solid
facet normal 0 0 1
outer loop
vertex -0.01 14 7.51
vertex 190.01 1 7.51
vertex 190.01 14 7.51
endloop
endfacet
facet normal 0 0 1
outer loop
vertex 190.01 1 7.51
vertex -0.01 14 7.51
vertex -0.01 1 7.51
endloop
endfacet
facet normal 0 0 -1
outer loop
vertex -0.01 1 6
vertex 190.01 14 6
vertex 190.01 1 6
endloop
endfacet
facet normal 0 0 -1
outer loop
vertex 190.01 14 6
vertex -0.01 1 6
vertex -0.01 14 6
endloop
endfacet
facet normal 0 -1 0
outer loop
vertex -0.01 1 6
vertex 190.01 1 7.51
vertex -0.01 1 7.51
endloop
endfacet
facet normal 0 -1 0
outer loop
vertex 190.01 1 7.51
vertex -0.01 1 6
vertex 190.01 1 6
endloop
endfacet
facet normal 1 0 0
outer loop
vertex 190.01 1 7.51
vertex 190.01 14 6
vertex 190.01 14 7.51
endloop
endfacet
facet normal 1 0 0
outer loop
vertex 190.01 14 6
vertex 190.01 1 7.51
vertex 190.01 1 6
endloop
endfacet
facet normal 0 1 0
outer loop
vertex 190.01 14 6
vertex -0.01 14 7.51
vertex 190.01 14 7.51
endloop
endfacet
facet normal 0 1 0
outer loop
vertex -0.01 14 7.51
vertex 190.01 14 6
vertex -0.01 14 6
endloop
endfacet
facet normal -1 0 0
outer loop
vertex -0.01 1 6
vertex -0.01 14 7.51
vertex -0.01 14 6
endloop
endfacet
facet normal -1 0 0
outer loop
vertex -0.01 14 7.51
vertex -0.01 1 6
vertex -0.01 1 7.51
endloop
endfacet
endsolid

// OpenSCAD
eps = 0.01;


b_t = 1;
b_w = 2;
t_t = 1.5;
s_h = 5;
s_w = 11;
s_l = 380/2;

sc = 1;
c_sp = 8;
c_d = 3.5;

brd_i = 7.5;
brd_h = b_t+brd_i+b_t;
brd_y = 6*b_w+3*s_w+2*c_sp;
brd_x = 40;

cl_x = 15;
cl_y = 25;
cl_yo = 5;
cl_t = 4;
cl_wt = 1.75;

module clip()
{
    translate([0,-cl_y,0])
    difference()
    {
        union()
        {
            translate([-cl_x/2,0,0])
                cube([cl_x,cl_y,cl_t+cl_wt+cl_wt]);
            translate([0,0,0])
                cylinder(d=cl_x,h=cl_t+2*cl_wt);
        }
        translate([-eps-cl_x/2,-cl_yo-cl_x,cl_wt])
            cube([cl_x+2*eps,cl_y+cl_x,cl_t]);
        
    }
}

    

module line()
{
    _y = s_w+2*b_w;
    _x = s_l;
    _z = b_t+s_h+t_t;
    translate([0,-_y/2,0])
    difference()
    {
        cube([_x,_y,_z]);
        translate([-eps,b_w,b_t])
            cube([_x+2*eps,s_w,s_h+t_t+eps]);
        translate([-eps,b_w-sc,_z-t_t])
            cube([_x+2*eps,s_w+2*sc,t_t+eps]);
    }
}

module transparent_cover()
{
    _y = s_w+2*b_w;
    _x = s_l;
    _z = b_t+s_h+t_t;
    
    translate([-eps,b_w-sc,_z-t_t])
        cube([_x+2*eps,s_w+2*sc,t_t+eps]);
}

module cover()
{
    translate([-brd_x+b_t,-brd_y/2+b_t,brd_h-t_t])
    {
        cube([brd_x-2*b_t,brd_y-2*b_t,t_t]);
        //translate([b_w-b_t+4,-b_t-eps,-brd_h+b_t+b_t+c_d])
        //    cube([c_d,b_w+2*eps,brd_h-c_d-b_t]);
        // stripe cuts
        _o = brd_h-s_h-b_t-t_t;
        translate([brd_x-b_t,brd_y/2-b_t,0])
        {
        translate([-b_w-eps,c_sp+2*b_w+s_w/2,-_o])
            cube([b_w+2*eps,s_w,_o+t_t]);
        translate([-b_w-eps,-s_w/2,-_o])
            cube([b_w+2*eps,s_w,_o+t_t]);
        translate([-b_w-eps,-(c_sp+2*b_w+3*s_w/2),-_o])
            cube([b_w+2*eps,s_w,_o+t_t]);
        }
    }
}

module half()
{
    translate([0,c_sp+2*b_w+s_w,0])
        line();
    translate([0,0,0])
        line();
    translate([0,-1*(c_sp+2*b_w+s_w),0])
        line();
    
    translate([-brd_x,-brd_y/2,0])
    difference()
    {
        cube([brd_x,brd_y,brd_h]);
        translate([b_w,b_w,b_t])
            cube([brd_x-2*b_w,brd_y-2*b_w,brd_h]);
        translate([sc,sc,brd_h-t_t])
            cube([brd_x-2*sc,brd_y-2*sc,t_t+eps]);
        
        // stripe cuts
        translate([brd_x,brd_y/2,0])
        {
        translate([-b_w-eps,c_sp+2*b_w+s_w/2,b_t])
            cube([b_w+2*eps,s_w,brd_h]);
        translate([-b_w-eps,-s_w/2,b_t])
            cube([b_w+2*eps,s_w,brd_h]);
        translate([-b_w-eps,-(c_sp+2*b_w+3*s_w/2),b_t])
            cube([b_w+2*eps,s_w,brd_h]);
        }
        
        // cable cut
        translate([b_w+4,-eps,b_t])
            cube([c_d,b_w+2*eps,brd_h]);
    }
    
    // clips
    translate([0,-brd_y/2,0])
    {
        translate([-brd_x/2,0,0])
            clip();
        translate([s_l-25,0,0])
            clip();
        translate([s_l/2-25,0,0])
            clip();
    }
    
    
}
//mirror() cover();
//mirror() 
//half();
transparent_cover();
